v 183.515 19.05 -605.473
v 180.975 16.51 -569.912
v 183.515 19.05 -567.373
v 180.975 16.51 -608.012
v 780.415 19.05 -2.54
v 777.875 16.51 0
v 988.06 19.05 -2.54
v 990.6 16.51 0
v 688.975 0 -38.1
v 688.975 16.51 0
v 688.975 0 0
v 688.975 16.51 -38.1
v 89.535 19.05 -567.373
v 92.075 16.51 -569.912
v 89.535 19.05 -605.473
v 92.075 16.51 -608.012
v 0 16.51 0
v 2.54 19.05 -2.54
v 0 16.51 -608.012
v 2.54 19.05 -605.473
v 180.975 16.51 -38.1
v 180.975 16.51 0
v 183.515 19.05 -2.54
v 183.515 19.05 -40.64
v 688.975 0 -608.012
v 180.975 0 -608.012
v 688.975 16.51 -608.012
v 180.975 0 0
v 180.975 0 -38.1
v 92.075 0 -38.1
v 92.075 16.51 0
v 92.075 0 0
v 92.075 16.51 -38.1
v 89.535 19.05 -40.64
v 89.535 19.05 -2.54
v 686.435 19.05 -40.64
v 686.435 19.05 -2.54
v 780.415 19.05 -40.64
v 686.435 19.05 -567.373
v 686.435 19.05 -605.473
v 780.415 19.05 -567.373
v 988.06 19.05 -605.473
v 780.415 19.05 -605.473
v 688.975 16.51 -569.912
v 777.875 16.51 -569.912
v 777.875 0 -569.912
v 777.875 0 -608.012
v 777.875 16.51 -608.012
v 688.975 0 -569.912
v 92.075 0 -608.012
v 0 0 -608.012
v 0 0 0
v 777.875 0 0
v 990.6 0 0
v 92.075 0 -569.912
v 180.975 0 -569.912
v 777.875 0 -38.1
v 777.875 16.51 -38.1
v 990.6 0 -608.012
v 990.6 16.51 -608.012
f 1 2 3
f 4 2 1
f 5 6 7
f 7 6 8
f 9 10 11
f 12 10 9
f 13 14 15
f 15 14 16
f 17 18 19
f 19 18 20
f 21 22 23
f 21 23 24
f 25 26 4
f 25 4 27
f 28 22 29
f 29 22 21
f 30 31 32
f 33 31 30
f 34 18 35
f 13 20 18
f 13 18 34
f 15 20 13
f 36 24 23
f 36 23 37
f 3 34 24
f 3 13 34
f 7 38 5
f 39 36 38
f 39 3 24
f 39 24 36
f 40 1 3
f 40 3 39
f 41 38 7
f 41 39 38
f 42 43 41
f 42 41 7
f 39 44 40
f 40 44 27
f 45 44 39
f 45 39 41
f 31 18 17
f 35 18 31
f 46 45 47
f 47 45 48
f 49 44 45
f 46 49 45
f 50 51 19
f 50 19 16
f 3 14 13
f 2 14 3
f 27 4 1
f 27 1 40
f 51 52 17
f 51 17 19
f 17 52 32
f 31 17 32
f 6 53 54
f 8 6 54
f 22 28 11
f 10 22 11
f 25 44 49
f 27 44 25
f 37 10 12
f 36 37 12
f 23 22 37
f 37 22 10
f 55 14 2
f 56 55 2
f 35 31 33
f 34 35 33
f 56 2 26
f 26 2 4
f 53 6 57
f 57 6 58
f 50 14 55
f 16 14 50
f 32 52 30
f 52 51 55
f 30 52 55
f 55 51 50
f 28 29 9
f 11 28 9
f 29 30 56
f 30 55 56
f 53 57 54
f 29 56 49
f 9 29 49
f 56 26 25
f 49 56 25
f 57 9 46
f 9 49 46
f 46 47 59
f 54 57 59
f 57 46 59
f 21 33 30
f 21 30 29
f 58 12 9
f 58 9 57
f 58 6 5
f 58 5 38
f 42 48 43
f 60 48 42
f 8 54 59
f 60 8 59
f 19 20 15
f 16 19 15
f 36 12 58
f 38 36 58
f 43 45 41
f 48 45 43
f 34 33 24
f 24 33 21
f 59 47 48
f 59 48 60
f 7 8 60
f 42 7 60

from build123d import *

# Parameters (mm, degrees)
SKETCH1_W           = 990.6
SKETCH1_H           = 608.0125
BOSS_EXTRUDE1_DEPTH = 19.05
SKETCH2_W           = 88.9
SKETCH2_H           = 38.1
CUT_EXTRUDE1_DEPTH  = 20.05
CHAMFER1_SIZE       = 2.54


with BuildPart() as part:
    # Sketch1 → Boss-Extrude1 (new body)
    with BuildSketch(Plane(origin=(0, 0, 0), x_dir=(1, 0, 0), z_dir=(0, 1, 0))):
        with Locations((495.3, 304.00625)):
            Rectangle(SKETCH1_W, SKETCH1_H)
    extrude(amount=BOSS_EXTRUDE1_DEPTH)

    # Sketch2 → Cut-Extrude1 (cut, through all)
    with BuildSketch(Plane(origin=(0, 19.05, 0), x_dir=(1, 0, 0), z_dir=(0, 1, 0))):
        with Locations((733.425, 588.9625)):
            Rectangle(SKETCH2_W, SKETCH2_H)
        with Locations((136.525, 588.9625)):
            Rectangle(SKETCH2_W, SKETCH2_H)
        with Locations((136.525, 19.05)):
            Rectangle(SKETCH2_W, SKETCH2_H)
        with Locations((733.425, 19.05)):
            Rectangle(SKETCH2_W, SKETCH2_H)
    extrude(amount=-CUT_EXTRUDE1_DEPTH, mode=Mode.SUBTRACT)

    # Chamfer1
    chamfer1_edges = [part.edges().sort_by_distance(p)[0] for p in [
        (990.6, 19.05, -304.00625),
        (884.2375, 19.05, -608.0125),
        (434.975, 19.05, 0),
        (884.2375, 19.05, 0),
        (434.975, 19.05, -608.0125),
        (46.0375, 19.05, -608.0125),
        (733.425, 19.05, -38.1),
        (688.975, 19.05, -19.05),
        (777.875, 19.05, -19.05),
        (180.975, 19.05, -19.05),
        (136.525, 19.05, -38.1),
        (92.075, 19.05, -19.05),
        (92.075, 19.05, -588.9625),
        (136.525, 19.05, -569.9125),
        (180.975, 19.05, -588.9625),
        (0, 19.05, -304.00625),
        (777.875, 19.05, -588.9625),
        (688.975, 19.05, -588.9625),
        (733.425, 19.05, -569.9125),
        (46.0375, 19.05, 0),
    ]]
    chamfer(chamfer1_edges, length=CHAMFER1_SIZE)


solid = part.part
